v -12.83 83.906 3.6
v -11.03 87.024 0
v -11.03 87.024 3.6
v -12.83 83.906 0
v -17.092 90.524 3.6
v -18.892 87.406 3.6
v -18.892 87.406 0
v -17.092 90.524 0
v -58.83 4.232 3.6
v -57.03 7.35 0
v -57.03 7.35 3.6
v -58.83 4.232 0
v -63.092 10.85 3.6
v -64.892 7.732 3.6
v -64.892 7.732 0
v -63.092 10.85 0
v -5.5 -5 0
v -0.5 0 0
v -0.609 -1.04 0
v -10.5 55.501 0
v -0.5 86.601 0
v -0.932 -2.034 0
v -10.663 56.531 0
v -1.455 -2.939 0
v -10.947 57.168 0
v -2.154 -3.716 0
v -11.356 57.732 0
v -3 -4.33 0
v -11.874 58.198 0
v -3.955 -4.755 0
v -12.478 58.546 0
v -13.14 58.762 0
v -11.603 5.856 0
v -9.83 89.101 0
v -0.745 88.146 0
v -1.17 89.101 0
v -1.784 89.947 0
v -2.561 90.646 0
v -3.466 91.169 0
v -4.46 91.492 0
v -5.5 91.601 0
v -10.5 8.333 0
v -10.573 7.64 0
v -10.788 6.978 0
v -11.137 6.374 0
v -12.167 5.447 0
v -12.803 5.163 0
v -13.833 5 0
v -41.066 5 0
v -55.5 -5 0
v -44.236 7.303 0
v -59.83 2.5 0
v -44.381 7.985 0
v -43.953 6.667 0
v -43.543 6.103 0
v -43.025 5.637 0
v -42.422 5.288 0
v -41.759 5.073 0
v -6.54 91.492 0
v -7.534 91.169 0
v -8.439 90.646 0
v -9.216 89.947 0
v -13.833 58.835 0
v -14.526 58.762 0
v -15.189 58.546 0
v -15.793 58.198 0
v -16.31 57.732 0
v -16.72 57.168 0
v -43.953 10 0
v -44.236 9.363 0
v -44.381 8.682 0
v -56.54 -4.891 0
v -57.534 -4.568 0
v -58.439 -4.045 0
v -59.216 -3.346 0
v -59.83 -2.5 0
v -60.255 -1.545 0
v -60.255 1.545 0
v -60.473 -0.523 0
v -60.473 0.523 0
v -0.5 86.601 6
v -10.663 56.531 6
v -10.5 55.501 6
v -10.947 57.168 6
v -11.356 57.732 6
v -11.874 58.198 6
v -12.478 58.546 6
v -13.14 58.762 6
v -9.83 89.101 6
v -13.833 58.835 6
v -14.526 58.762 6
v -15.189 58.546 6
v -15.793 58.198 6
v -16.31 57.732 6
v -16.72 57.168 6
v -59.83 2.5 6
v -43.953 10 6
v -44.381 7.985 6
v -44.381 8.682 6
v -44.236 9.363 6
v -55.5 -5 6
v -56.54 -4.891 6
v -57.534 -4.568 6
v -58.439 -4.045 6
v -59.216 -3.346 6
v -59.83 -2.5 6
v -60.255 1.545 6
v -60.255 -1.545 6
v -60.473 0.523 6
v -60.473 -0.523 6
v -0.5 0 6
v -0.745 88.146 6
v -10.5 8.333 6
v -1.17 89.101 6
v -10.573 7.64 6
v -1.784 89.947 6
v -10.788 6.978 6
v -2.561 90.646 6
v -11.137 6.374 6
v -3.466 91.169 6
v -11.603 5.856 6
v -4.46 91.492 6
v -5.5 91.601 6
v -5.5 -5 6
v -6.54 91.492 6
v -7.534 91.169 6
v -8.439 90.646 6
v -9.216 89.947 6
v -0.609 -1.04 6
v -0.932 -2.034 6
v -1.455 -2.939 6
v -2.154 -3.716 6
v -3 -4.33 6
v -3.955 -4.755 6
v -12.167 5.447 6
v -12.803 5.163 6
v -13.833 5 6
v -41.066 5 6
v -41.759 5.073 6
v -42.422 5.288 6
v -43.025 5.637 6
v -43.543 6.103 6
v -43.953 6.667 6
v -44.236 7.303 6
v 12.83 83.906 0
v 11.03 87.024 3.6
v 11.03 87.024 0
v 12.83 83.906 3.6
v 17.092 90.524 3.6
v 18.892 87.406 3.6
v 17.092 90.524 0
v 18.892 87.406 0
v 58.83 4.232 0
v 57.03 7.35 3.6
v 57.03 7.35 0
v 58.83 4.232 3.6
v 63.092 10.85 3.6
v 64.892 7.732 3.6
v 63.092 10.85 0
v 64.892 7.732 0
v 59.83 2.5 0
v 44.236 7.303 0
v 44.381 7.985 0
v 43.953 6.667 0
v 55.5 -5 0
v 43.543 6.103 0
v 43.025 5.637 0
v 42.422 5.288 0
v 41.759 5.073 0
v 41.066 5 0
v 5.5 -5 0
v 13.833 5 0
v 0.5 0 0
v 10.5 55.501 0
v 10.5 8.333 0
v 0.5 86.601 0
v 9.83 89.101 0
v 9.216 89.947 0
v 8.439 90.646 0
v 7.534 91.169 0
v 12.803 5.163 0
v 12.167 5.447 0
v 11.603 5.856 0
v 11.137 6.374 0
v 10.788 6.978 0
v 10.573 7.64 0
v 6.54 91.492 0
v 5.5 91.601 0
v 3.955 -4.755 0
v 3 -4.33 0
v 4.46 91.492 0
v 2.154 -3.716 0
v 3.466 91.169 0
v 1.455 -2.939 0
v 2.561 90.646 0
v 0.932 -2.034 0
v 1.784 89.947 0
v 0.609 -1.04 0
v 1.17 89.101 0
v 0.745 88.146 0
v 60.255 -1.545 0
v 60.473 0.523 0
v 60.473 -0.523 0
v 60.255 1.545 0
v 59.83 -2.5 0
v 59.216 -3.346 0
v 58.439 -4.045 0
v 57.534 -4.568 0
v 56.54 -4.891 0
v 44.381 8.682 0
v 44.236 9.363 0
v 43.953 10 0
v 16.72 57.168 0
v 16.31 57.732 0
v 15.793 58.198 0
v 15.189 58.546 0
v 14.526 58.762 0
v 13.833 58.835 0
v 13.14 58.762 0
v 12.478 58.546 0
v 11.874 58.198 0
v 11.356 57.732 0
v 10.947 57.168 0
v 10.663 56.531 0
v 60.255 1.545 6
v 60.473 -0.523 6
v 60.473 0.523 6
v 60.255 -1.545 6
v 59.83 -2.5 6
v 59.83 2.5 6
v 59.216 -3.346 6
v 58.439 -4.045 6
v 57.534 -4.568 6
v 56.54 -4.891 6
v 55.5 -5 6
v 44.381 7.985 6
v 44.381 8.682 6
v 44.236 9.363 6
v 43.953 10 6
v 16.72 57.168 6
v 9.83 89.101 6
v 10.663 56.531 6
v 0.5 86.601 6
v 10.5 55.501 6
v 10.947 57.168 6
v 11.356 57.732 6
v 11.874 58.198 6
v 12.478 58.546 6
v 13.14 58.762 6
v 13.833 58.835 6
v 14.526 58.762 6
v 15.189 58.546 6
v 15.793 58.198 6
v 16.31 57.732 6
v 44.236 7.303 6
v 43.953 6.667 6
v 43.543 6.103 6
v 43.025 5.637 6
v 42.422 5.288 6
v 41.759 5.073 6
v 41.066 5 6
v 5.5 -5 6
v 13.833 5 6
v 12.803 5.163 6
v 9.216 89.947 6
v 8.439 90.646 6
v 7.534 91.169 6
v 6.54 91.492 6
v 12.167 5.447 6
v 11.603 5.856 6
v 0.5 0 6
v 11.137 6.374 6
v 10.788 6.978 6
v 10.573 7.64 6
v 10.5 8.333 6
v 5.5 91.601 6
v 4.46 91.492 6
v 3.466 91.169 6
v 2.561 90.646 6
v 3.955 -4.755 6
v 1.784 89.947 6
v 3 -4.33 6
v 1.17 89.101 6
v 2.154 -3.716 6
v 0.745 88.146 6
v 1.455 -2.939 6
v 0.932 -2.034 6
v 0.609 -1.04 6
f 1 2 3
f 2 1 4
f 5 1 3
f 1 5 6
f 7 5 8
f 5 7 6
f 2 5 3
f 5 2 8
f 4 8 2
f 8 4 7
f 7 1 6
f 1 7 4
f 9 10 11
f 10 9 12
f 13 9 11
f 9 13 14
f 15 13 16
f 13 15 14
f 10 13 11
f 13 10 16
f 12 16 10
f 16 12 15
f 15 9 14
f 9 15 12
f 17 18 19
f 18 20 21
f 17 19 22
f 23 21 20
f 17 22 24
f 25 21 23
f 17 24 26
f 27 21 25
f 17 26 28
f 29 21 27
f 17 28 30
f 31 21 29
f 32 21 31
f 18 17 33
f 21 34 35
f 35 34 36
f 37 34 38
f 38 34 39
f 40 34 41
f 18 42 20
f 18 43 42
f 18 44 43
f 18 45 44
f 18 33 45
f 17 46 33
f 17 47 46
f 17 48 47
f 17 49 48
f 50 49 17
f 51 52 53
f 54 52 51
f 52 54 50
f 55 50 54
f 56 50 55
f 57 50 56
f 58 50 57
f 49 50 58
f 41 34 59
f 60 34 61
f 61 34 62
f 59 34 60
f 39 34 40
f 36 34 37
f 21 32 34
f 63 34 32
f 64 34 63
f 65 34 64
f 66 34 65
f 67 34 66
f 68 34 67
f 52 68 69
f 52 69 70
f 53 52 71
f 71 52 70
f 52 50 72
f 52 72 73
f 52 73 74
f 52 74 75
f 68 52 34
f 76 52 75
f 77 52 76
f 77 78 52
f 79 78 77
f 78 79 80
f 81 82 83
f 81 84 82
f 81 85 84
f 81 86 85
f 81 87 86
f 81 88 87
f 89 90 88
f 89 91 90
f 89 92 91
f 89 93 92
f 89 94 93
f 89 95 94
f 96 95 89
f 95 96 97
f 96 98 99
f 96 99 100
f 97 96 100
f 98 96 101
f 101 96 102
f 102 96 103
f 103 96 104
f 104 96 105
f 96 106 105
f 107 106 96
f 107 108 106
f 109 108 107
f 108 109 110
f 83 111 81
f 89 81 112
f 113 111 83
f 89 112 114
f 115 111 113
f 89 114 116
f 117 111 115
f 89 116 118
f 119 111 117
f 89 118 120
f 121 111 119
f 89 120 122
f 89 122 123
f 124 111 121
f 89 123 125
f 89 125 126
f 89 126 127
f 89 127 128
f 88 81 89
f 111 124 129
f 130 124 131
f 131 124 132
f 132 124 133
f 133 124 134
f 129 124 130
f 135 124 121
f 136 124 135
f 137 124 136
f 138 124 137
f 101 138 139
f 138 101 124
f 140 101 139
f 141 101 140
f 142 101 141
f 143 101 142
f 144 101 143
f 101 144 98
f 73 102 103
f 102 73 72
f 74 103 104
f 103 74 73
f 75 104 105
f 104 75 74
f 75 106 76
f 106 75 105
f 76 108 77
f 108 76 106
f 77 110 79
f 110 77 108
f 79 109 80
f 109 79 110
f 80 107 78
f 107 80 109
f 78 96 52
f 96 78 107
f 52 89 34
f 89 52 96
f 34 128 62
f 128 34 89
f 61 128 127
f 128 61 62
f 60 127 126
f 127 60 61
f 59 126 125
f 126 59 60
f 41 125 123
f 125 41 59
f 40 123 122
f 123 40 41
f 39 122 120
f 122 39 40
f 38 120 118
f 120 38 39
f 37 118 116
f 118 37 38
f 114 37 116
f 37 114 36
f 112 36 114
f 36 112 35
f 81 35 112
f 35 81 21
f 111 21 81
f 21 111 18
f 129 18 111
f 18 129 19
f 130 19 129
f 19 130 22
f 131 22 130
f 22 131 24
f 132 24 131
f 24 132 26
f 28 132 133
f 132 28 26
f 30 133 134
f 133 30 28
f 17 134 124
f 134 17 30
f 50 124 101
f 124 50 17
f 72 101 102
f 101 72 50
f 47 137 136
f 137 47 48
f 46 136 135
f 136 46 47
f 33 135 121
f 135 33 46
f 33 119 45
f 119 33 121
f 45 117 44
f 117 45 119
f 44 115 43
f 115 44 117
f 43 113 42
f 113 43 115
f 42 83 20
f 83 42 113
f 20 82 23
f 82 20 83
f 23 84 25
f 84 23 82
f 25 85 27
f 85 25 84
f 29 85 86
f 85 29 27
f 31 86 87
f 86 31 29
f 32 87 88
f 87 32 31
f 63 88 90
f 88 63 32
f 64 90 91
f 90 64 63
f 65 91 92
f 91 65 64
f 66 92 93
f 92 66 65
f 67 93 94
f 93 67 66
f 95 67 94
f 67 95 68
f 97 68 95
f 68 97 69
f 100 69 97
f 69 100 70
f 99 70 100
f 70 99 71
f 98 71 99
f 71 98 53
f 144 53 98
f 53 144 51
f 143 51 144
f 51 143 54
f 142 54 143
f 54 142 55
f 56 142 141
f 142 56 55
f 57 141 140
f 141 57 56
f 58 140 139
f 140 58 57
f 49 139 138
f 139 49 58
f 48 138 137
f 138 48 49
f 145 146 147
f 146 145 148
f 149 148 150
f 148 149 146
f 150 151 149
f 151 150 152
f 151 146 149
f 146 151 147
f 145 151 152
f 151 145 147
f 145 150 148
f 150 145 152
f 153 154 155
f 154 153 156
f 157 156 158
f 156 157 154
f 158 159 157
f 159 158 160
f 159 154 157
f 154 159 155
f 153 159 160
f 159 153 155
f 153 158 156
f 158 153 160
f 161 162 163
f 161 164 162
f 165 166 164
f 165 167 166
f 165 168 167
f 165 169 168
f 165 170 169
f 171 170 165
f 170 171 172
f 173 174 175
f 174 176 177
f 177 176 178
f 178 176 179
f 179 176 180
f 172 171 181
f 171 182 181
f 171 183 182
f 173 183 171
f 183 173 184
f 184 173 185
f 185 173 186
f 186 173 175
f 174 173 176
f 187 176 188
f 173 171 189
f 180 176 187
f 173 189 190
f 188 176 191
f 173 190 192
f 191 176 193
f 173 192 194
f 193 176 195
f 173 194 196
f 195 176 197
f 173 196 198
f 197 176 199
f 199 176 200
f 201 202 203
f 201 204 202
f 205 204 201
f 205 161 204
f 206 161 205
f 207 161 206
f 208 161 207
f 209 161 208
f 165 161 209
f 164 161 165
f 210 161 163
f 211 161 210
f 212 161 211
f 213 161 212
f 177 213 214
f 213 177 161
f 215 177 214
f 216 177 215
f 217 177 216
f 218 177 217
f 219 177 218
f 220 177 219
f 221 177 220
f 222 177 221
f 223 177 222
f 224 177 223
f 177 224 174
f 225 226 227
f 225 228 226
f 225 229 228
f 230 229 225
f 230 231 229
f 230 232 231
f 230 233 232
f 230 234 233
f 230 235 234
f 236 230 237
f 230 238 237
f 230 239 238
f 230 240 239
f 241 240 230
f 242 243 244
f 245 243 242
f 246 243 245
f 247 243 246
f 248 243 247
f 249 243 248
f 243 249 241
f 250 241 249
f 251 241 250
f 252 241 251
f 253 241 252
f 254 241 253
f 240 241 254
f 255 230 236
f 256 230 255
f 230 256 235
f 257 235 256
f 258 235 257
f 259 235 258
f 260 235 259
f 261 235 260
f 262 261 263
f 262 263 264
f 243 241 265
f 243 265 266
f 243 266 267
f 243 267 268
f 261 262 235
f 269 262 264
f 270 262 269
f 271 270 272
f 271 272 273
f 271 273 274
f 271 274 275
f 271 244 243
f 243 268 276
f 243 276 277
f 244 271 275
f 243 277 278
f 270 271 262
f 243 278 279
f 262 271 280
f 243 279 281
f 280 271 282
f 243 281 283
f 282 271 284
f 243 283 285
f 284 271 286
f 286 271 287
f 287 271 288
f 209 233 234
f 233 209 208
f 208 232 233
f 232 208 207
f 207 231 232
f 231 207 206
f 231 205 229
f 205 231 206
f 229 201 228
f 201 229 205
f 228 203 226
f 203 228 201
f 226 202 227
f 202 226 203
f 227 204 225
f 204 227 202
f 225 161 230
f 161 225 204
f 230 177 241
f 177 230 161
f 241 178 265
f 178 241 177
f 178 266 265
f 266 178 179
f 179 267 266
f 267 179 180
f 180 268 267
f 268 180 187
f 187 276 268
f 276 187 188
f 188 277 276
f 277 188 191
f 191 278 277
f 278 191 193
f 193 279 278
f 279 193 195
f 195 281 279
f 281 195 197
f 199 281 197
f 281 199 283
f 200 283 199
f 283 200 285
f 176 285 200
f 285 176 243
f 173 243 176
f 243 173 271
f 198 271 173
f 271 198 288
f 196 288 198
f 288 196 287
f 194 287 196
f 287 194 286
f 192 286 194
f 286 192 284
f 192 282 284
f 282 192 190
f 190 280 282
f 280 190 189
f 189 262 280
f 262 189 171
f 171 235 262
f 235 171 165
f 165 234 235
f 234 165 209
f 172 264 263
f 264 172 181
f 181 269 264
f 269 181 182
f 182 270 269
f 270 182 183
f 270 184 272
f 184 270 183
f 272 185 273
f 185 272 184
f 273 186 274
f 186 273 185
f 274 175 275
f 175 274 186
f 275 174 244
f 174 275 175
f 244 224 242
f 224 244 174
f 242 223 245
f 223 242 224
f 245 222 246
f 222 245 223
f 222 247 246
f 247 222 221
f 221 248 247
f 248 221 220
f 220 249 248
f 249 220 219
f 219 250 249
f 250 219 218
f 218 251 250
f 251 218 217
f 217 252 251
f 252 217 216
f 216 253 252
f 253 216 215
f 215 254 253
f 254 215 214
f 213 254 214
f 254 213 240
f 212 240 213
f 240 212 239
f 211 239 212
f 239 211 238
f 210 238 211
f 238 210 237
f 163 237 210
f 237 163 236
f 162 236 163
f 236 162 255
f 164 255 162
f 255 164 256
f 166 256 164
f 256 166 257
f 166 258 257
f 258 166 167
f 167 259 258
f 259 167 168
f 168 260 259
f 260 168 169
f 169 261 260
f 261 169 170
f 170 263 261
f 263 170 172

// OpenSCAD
// Coin handling parts
// Adrian McCarthy 2022-06-09

module coin(od, th, head="", clr="DarkGray", reeds=0, internal_sides=1, nozzle_d=0.4) {
    id = od - 4*nozzle_d;
    color(clr)
        translate([0, 0, th/2]) {
            linear_extrude(th, convexity=10, center=true)
                difference() {
                    circle(d=od, $fs=nozzle_d/2);
                    if (internal_sides != 1) {
                        rotate([0, 0, -90]) circle(d=id, $fn=internal_sides);
                    } else {
                        circle(d=id, $fs=nozzle_d/2);
                    }
                    if (reeds > 0) {
                        for (i = [1:reeds]) {
                            rotate([0, 0, i*360/reeds])
                                translate([(od + nozzle_d)/2, 0, 0])
                                    rotate([0, 0, 45])
                                        square(nozzle_d, center=true);
                        }
                    }
                }
                linear_extrude(th-nozzle_d, convexity=10, center=true)
                    circle(d=id, $fs=0.2);

            // Heads
            translate([0, 0, nozzle_d/2])
                linear_extrude(th/2, convexity=10)
                    text(head, size=id/len(head), halign="center", valign="center");
                
            // Tails
            iid = id-2*nozzle_d;
            translate([0, 0, -th/4])
                linear_extrude(th/2, convexity=10, center=true)
                    if (internal_sides != 1) {
                        rotate([0, 0, -90])
                            circle(d=iid, $fn=internal_sides);
                    } else {
                        circle(d=iid, $fs=nozzle_d/2);
                    }
        }
}

USD_coins = [
//   name           od      id      mark    color       reeds   sides
    ["penny",       19.05,  1.52,   "1¢",   "Peru",       0,      1     ],
    ["nickel",      21.21,  1.95,   "5¢",   "DarkGray",   0,      1     ],
    ["dime",        17.91,  1.35,  "10¢",   "DarkGray", 118,      1     ],
    ["quarter",     24.26,  1.75,  "25¢",   "DarkGray", 119,      1     ],
    ["halfdollar",  30.61,  2.15,  "50¢",   "DarkGray", 150,      1     ],
    ["Ikedollar",   38.10,  2.58,   "$1",   "Silver",     0,      1     ],
    ["SBAdollar",   26.50,  2.00,   "$1",   "DarkGray",   0,     11     ],
    ["Sacdollar",   26.49,  2.00,   "$1",   "GoldenRod",  0,      1     ]
];

function cumulative(index, table, column) =
    index < 0 ? 0 :
        table[index][column] +
            (index == 0 ? 0 : cumulative(index-1, table, column));

module make_coins(coins=USD_coins) {
    for (i=[0:len(coins)-1]) {
        c = coins[i];
        translate([cumulative(i, coins, 1) - c[1]/2 + i, 0, 0])
            coin(c[1], c[2], c[3], c[4], c[5], c[6]);
    }
}

module easel(panel_h=100, panel_th=5, peg_th=4, th=6, angle=60, nozzle_d=0.4) {
    peg_l = panel_th+2;
    outer_r = panel_h/20;
    inner_r = 2/3*outer_r;

    module triangle(hypot=panel_h) {
        // A right triangle whose hypotenuse has unit length.
        tri = [
            [0, 0],
            [cos(angle), 0],
            [0, sin(angle)]
        ];
        scale([hypot, hypot]) polygon(tri);
    }
    
    module peg(l, th) {
        translate([0, 0, th/2 - nozzle_d])
            rotate([0, 90, 0])
                linear_extrude(l)
                    translate([0, -th/2])
                        square(th-nozzle_d);
    }
    
    module pegs(l, th, panel_h, margin, delta) {
        translate([0, panel_h*sin(angle), 0])
        rotate([0, 0, 90-angle]) translate([delta, 0, 0]) {
            translate([0, 0        - margin, 0]) peg(l, th);
            translate([0, -panel_h + margin, 0]) peg(l, th);
        }
    }

    module right_bracket() {
        linear_extrude(th, center=true) difference() {
            offset(r=outer_r, $fs=nozzle_d/2) triangle();
            offset(r=inner_r, $fs=nozzle_d/2)
                offset(delta=-(inner_r+outer_r)) triangle();
        }
        
        // Translation pushes the pegs to the edge of the bracket
        // so that it can print without supports.
        translate([0, 0, (peg_th - th)/2])
        pegs(peg_l, peg_th, panel_h, margin=peg_th, delta=outer_r);
    }
    
    module left_bracket() {
        mirror([-1, 0, 0]) right_bracket();
    }
    
    base_x = 2*outer_r + 1;
    translate([-base_x/2, 0, th/2]) left_bracket();
    translate([ base_x/2, 0, th/2]) right_bracket();
}

easel(angle=60);
